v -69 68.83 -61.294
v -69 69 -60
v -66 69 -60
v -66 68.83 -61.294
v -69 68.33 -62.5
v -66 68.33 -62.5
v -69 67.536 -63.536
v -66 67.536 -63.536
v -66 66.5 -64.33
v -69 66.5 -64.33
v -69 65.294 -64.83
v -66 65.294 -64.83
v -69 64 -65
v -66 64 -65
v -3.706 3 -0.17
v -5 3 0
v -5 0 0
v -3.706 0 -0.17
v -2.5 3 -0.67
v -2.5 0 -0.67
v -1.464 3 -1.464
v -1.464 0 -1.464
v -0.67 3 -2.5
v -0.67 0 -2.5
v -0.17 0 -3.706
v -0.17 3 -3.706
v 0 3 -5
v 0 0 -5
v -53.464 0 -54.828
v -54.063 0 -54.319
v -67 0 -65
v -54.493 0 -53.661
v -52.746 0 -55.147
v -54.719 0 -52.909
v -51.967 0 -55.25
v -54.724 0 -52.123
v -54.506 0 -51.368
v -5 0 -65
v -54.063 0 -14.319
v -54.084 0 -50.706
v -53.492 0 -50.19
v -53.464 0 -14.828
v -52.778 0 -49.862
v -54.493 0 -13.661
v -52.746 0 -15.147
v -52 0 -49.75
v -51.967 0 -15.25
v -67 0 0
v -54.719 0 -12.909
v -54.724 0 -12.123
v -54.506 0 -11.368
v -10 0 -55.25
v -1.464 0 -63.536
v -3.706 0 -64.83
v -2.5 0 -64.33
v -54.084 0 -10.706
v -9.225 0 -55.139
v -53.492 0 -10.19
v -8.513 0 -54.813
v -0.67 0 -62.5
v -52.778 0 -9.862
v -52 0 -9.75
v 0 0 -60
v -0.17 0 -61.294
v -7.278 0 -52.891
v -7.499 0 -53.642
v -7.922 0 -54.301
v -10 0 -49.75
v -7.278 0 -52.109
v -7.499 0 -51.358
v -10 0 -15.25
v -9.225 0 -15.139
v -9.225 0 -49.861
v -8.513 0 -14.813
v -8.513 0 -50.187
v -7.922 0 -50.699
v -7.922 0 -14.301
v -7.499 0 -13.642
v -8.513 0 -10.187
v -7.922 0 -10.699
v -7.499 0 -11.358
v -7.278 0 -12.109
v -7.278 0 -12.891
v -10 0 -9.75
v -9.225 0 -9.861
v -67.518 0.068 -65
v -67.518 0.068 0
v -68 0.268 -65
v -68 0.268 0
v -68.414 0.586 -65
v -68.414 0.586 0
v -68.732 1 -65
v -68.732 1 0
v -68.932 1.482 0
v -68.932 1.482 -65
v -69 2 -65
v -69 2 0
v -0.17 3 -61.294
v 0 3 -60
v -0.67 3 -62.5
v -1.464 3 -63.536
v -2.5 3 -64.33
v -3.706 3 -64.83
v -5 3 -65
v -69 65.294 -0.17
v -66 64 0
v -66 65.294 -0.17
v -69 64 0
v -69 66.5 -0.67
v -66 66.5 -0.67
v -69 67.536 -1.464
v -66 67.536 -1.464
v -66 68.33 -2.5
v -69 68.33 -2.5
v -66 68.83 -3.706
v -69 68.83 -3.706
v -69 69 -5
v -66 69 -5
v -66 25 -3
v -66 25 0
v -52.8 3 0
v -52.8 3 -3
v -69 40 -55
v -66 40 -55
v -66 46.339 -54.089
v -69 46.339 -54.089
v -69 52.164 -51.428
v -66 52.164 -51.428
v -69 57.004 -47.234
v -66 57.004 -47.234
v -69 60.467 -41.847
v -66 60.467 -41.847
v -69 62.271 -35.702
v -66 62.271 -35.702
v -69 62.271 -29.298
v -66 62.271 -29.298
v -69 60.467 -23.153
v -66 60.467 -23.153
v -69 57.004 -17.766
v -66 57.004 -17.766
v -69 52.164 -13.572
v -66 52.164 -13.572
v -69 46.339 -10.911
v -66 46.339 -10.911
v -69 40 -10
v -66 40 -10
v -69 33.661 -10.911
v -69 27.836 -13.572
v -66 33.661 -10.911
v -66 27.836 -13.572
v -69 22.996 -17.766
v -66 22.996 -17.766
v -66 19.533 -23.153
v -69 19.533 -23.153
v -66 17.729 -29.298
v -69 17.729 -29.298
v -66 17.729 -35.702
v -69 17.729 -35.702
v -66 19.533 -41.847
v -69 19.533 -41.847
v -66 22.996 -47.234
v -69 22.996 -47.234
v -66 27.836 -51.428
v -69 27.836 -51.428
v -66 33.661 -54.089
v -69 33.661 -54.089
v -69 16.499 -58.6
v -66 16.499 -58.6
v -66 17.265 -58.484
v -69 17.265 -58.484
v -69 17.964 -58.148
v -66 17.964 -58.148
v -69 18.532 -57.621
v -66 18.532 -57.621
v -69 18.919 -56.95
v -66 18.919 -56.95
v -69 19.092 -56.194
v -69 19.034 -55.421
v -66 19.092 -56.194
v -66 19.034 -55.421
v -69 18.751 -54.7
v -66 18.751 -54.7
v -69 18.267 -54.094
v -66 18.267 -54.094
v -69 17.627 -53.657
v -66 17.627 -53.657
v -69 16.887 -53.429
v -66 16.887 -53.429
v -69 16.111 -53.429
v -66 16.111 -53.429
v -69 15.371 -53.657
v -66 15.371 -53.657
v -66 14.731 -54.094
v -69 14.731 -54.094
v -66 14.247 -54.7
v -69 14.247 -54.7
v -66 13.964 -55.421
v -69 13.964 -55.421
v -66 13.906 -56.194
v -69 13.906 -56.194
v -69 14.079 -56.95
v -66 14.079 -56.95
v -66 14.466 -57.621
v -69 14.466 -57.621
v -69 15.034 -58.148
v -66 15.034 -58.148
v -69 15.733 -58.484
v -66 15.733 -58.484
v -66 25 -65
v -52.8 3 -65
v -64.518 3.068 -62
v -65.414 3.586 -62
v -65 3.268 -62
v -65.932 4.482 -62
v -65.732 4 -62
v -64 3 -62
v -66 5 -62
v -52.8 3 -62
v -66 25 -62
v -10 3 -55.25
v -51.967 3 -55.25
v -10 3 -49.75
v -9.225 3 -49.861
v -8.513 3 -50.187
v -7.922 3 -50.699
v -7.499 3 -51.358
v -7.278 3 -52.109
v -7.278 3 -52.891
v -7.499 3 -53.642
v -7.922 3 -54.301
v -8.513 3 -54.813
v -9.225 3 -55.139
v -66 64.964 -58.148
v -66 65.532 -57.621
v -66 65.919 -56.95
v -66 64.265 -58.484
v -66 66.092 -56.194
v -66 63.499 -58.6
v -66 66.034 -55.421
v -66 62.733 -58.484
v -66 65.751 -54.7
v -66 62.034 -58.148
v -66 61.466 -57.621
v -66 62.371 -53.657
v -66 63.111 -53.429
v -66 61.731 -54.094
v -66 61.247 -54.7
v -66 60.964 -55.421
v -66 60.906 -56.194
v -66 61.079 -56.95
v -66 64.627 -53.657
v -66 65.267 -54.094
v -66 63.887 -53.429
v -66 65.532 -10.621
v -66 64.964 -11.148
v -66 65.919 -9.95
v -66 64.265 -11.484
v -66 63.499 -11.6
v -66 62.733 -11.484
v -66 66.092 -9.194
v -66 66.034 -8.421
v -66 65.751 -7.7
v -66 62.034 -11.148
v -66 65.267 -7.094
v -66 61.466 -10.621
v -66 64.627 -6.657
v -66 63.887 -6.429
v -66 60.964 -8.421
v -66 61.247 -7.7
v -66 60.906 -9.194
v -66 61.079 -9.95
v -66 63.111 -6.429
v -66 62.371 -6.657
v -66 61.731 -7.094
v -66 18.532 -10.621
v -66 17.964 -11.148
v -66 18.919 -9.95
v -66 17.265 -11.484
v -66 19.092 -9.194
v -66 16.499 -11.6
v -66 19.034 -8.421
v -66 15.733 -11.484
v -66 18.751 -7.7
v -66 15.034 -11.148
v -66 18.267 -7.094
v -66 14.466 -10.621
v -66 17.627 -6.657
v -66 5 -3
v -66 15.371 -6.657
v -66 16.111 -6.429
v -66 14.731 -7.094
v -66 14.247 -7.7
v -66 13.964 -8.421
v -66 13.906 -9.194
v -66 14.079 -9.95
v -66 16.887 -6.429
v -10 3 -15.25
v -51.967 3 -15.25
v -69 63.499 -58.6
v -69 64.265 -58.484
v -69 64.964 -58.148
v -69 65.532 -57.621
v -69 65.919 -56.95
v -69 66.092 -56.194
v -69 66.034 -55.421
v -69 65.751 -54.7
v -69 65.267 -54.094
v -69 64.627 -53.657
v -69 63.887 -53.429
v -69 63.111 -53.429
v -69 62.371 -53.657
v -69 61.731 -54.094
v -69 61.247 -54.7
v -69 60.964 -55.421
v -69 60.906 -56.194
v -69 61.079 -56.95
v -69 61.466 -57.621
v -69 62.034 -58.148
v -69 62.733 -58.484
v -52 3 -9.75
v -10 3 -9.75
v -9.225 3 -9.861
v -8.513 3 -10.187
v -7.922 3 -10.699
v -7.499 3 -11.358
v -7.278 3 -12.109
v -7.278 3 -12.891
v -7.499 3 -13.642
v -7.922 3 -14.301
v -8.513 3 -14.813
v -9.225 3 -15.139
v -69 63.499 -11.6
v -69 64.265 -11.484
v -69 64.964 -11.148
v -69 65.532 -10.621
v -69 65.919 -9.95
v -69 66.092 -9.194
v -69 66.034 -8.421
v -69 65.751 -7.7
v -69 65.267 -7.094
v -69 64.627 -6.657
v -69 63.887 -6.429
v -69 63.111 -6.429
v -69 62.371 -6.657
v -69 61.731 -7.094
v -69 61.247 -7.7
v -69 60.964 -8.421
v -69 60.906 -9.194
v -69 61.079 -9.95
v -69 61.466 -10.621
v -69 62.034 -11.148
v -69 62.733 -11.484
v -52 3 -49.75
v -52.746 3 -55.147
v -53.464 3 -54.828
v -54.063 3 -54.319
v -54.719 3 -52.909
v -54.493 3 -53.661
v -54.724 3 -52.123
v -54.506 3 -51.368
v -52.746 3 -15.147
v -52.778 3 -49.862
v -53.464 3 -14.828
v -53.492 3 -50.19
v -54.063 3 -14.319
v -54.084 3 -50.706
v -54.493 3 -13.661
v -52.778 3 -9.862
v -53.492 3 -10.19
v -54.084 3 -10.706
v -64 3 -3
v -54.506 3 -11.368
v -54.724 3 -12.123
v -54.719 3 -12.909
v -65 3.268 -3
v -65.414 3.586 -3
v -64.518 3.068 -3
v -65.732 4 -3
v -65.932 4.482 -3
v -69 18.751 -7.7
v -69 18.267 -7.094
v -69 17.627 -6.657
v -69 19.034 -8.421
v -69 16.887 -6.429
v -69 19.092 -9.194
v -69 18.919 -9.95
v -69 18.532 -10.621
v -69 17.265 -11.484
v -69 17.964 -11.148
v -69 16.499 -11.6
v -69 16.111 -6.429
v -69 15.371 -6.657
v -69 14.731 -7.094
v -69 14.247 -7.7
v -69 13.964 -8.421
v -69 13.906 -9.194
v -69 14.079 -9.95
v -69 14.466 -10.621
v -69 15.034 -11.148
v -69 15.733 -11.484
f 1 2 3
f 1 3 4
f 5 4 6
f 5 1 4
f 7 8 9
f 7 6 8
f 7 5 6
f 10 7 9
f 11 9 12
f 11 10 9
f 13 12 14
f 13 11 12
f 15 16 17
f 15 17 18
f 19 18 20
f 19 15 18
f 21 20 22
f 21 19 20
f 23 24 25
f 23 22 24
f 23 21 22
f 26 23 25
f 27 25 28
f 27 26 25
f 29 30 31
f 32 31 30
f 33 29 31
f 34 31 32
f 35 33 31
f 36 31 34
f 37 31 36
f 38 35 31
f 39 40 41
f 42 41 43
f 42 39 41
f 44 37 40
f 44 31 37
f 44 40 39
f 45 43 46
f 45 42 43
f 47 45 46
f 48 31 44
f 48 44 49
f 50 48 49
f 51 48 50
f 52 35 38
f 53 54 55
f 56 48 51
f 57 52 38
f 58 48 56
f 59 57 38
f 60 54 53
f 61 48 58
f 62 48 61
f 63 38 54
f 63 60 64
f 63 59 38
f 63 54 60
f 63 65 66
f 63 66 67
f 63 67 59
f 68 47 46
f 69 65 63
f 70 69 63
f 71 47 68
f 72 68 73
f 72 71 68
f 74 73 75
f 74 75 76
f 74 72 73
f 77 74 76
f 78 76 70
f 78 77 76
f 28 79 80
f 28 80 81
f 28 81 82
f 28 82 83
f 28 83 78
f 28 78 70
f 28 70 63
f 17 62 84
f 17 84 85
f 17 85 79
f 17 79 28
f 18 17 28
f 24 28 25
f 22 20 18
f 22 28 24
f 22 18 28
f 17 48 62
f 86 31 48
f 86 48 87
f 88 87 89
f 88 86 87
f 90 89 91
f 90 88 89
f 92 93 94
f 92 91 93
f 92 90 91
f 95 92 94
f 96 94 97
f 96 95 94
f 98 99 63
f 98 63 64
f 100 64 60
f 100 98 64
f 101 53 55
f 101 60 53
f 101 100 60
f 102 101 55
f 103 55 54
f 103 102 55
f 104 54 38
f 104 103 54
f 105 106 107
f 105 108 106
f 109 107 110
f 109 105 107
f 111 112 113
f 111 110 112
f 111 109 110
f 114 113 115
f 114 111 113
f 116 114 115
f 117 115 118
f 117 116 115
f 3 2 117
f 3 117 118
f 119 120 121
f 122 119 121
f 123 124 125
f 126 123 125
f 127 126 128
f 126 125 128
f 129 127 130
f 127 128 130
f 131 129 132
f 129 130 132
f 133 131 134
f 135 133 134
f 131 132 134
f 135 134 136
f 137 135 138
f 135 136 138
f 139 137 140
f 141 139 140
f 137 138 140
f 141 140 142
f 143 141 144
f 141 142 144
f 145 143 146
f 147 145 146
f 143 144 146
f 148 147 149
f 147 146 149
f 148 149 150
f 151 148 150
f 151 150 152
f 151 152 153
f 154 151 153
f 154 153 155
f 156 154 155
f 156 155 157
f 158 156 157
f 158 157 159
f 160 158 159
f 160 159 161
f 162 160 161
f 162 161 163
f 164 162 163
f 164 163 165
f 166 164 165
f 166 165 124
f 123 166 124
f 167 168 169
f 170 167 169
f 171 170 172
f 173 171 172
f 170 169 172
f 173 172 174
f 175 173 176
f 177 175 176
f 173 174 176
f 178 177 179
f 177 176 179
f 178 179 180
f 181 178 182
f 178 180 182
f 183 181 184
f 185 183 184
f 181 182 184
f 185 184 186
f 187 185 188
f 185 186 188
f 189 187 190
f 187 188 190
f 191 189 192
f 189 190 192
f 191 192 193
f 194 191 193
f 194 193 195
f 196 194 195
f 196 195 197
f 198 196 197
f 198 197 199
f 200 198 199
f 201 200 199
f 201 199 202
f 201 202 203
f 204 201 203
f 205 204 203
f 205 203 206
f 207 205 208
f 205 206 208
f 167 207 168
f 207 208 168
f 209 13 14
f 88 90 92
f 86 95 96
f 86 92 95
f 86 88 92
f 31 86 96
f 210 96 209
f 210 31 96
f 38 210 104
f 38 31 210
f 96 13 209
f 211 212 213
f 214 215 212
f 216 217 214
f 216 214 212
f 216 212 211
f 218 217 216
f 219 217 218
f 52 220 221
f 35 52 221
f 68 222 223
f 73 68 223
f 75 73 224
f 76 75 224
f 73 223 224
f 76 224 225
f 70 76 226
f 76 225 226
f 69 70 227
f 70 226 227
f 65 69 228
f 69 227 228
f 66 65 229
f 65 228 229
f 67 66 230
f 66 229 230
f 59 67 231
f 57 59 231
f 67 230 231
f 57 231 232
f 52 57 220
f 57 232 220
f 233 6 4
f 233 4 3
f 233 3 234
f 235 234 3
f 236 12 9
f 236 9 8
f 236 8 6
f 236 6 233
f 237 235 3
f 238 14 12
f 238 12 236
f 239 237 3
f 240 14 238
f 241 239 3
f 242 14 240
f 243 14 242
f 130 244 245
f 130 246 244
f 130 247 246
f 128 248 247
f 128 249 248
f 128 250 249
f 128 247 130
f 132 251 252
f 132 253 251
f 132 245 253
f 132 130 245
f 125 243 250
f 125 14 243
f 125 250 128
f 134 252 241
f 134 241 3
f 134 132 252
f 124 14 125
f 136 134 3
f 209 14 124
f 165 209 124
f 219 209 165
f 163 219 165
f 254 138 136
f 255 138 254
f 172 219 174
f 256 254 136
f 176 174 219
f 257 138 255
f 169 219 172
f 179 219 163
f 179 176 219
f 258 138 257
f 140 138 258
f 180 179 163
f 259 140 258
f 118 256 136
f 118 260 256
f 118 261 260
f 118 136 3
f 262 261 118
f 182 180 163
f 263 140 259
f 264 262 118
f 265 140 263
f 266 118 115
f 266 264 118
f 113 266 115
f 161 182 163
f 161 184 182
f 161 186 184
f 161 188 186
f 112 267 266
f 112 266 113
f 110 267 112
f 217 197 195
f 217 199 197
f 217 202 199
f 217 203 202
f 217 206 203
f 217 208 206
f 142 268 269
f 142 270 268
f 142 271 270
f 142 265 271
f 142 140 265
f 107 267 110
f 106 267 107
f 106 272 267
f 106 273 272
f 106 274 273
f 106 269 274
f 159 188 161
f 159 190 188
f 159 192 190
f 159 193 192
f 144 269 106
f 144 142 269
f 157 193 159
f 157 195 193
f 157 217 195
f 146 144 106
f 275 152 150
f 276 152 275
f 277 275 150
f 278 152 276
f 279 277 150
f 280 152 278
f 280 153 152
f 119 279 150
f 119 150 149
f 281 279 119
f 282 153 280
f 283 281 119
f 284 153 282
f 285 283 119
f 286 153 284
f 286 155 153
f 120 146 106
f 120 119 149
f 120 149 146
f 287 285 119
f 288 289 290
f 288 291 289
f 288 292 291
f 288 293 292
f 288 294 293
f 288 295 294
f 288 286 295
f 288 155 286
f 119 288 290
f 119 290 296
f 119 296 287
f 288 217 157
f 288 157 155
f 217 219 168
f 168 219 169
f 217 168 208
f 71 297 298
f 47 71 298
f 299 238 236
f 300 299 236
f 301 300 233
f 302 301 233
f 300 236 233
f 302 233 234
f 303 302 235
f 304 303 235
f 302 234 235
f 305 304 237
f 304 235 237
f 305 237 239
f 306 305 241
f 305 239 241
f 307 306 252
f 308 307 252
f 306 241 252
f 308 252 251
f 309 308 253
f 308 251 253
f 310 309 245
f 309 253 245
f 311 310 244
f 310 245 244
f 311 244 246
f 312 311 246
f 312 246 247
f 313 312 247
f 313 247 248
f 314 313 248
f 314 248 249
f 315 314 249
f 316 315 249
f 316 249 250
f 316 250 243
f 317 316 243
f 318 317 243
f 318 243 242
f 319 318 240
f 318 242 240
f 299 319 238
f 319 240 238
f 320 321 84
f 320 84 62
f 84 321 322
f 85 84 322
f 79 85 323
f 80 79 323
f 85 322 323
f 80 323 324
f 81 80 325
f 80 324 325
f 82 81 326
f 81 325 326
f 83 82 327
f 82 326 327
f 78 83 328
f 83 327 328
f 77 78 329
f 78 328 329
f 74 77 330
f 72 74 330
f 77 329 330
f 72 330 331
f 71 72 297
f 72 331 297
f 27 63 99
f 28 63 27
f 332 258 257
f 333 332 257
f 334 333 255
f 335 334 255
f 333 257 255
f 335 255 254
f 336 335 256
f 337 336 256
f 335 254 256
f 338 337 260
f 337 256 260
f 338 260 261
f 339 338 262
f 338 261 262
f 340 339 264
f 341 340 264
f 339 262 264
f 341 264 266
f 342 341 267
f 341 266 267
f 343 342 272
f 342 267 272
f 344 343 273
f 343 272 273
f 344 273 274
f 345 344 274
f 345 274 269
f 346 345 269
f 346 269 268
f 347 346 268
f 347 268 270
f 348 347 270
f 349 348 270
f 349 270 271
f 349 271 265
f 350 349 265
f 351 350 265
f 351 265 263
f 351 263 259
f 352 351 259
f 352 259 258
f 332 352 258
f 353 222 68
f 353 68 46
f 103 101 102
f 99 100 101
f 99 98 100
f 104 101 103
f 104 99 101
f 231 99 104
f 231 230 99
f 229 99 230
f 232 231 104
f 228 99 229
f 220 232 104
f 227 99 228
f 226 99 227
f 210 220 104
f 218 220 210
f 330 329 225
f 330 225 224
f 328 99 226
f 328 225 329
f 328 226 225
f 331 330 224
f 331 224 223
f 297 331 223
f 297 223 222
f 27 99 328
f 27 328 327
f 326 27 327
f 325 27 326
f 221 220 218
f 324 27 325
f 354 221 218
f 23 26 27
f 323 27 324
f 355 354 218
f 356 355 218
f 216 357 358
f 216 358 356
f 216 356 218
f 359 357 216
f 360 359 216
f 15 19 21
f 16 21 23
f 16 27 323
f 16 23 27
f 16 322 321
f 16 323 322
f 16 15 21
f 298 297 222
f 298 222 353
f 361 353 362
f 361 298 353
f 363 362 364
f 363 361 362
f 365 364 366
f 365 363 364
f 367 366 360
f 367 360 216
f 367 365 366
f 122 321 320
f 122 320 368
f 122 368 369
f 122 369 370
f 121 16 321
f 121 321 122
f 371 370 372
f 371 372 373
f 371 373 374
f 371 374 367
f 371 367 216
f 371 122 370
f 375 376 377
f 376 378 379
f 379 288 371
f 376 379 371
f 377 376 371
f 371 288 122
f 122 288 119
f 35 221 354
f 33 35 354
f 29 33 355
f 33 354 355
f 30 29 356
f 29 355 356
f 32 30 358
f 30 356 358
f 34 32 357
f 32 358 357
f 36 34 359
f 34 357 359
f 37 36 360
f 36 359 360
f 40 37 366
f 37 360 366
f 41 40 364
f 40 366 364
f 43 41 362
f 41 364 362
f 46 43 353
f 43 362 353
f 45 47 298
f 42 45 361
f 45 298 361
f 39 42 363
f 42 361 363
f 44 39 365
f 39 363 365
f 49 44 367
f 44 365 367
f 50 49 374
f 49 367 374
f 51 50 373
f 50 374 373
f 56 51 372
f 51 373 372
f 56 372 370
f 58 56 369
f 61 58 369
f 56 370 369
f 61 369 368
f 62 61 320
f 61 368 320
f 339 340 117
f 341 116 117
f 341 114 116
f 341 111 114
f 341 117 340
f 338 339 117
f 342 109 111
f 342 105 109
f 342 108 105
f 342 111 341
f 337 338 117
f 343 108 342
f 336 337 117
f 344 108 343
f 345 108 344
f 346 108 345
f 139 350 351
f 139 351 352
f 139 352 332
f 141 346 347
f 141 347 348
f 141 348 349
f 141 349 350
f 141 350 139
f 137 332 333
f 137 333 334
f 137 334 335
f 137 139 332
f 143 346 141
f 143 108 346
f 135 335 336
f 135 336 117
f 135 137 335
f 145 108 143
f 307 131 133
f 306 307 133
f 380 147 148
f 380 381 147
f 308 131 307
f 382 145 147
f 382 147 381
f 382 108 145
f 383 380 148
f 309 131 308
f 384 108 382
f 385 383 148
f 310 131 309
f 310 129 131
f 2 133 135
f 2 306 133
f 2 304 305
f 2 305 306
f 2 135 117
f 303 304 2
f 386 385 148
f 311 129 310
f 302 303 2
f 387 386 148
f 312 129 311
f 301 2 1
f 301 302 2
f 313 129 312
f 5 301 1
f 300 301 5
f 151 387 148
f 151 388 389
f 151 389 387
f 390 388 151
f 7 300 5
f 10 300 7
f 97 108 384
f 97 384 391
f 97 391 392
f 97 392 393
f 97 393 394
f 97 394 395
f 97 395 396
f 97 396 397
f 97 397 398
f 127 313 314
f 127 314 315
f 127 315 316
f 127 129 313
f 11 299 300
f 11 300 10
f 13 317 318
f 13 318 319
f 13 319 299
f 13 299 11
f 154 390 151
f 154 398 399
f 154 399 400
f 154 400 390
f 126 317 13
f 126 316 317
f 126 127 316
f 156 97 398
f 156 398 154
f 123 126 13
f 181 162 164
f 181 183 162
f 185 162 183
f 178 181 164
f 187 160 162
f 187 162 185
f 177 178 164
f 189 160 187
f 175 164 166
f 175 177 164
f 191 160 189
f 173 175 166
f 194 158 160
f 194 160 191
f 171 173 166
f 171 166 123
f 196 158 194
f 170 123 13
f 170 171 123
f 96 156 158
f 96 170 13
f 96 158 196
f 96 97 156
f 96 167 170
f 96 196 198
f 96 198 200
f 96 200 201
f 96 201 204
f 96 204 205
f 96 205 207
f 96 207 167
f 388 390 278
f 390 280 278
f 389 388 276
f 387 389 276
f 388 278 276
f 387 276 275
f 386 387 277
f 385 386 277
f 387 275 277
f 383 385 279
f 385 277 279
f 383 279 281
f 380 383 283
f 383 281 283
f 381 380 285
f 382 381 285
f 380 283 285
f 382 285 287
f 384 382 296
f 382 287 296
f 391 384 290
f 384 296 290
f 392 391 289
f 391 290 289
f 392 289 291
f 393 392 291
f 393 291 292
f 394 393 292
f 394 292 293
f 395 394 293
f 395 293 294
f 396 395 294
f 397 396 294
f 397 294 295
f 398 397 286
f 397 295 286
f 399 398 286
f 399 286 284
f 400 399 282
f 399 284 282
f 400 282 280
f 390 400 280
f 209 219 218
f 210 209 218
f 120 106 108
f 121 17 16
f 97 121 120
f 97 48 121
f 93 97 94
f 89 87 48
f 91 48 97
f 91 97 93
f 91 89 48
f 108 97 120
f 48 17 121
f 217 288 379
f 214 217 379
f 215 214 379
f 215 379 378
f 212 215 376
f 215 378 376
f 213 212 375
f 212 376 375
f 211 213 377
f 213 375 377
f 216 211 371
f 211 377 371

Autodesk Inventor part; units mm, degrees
ref_plane "YZ Plane" through (0, 0, 0) normal (1, 0, 0) x (0, 1, 0)
ref_plane "XZ Plane" through (0, 0, 0) normal (0, 1, 0) x (-1, 0, 0)
ref_plane "XY Plane" through (0, 0, 0) normal (0, 0, 1) x (1, 0, 0)
sketch "Sketch1" plane through (0, 0, 0) normal (0, 1, 0) x (-1, 0, 0)
  line L0 (0, 0) -> (69, 0)
  line L1 (69, 0) -> (69, -65)
  line L2 (69, -65) -> (0, -65)
  line L3 (0, -65) -> (0, 0)
  dimension "d0" = 69
  dimension "d1" = 65
extrude "Extrusion1" add sketch "Sketch1" along normal blind 3
sketch "Sketch2" plane through (0, 3, 0) normal (0, 1, 0) x (1, 0, 0)
  line L0 (0, 65) -> (-69, 65) projected
  line L1 (-69, 65) -> (-66, 65)
  line L2 (-66, 65) -> (-66, 0)
  line L3 (-66, 0) -> (-69, 0)
  line L4 (-69, 0) -> (-69, 65)
  point P0 (0, 0)
  dimension "d4" = 3
  dimension "d5" = 65
extrude "Extrusion2" add sketch "Sketch2" along normal blind 66
fillet "Fillet1" radius 2 2 edges at (-66, 3, -32.5) (-69, 0, -32.5)
sketch "Sketch3" plane through (0, 0, 0) normal (0, 0, 1) x (1, 0, 0)
  line L0 (-67, 0) -> (0, 0) projected
  line L1 (-66, 0) -> (-51, 0) construction
  line L2 (-66, 5) -> (-66, 69) projected
  line L3 (-66, 5) -> (-66, 0)
  line L4 (-66, 5) -> (-61, 5) construction
  line L5 (-66, 0) -> (-51, 0)
  line L6 (-66, 0) -> (-66, 25)
  line L7 (-66, 25) -> (-51, 0)
  dimension "d12" = 5
  dimension "d13" = 90
  dimension "d14" = 15
  dimension "d15" = 90
  dimension "d16" = 25
extrude "Extrusion3" add sketch "Sketch3" against normal blind 3
pattern_linear "Rectangular Pattern1" count 2 spacing 62 along (0, 0, -1) of "Extrusion3"
sketch "Sketch4" plane through (-66, 69, 0) normal (1, 0, 0) x (0, 0, -1)
  circle A0 centre (32.5, -29) radius 22.5
  line L0 (0, 0) -> (65, 0) projected
  line L1 (0, -44) -> (0, 0) projected
  point P0 (0, -69)
  dimension "d22" = 45
  dimension "d23" = 29
  dimension "d24" = 32.5
extrude "Extrusion4" cut sketch "Sketch4" against normal blind 3
sketch "Sketch5" plane through (-66, 69, 0) normal (1, 0, 0) x (0, 0, -1)
  circle A0 centre (9, -5.501) radius 2.6
  line L0 (0, 0) -> (65, 0) projected
  line L1 (0, -44) -> (0, 0) projected
  circle A1 centre (56, -5.501) radius 2.6
  circle A2 centre (9, -52.501) radius 2.6
  circle A3 centre (56, -52.501) radius 2.6
  point P0 (0, -69)
  dimension "d27" = 5.2
  dimension "d28" = 5.501
  dimension "d29" = 9
  dimension "d32" = 47
  dimension "d35" = 47
extrude "Extrusion5" cut sketch "Sketch5" against normal blind 3
sketch "Sketch6" plane through (0, 3, 0) normal (0, 1, 0) x (1, 0, 0)
  line L0 (-52.8, 0) -> (0, 0) projected
  line L1 (0, 0) -> (0, 65) projected
  arc A0 (-51.9673, 15.2498) -> (-52, 9.75) centre (-52, 12.5) ccw
  line L2 (-69, 65) -> (-69, 0) projected
  line L3 (-11.5517, 12.5) -> (-9.4517, 12.5) construction
  line L4 (-11.5517, 9.75) -> (-52, 9.75)
  line L5 (-52, 12.5) -> (-10, 12.5) construction
  line L6 (-52, 9.75) -> (-10, 9.75)
  line L7 (-10, 15.25) -> (-52, 15.25)
  arc A1 (-52, 15.25) -> (-52, 9.75) centre (-52, 12.5) ccw
  arc A2 (-10, 9.75) -> (-10, 15.25) centre (-10, 12.5) ccw
  point P0 (-31, 12.5)
  dimension "d48" = 5.5
  dimension "d49" = 12.5
  dimension "d50" = 12.5
  dimension "d54" = 17
  dimension "d62" = 42
  dimension "d63" = 5.5
extrude "Extrusion6" cut sketch "Sketch6" against normal blind 3
pattern_linear "Rectangular Pattern2" count 2 spacing 40 along (0, 0, -1) of "Extrusion6"
fillet "Fillet2" radius 5 2 edges at (-67.5, 69, 0) (-67.5, 69, -65)
fillet "Fillet3" radius 5 2 edges at (0, 1.5, 0) (0, 1.5, -65)
properties part number "NEMA23_StepperonlineMount"
